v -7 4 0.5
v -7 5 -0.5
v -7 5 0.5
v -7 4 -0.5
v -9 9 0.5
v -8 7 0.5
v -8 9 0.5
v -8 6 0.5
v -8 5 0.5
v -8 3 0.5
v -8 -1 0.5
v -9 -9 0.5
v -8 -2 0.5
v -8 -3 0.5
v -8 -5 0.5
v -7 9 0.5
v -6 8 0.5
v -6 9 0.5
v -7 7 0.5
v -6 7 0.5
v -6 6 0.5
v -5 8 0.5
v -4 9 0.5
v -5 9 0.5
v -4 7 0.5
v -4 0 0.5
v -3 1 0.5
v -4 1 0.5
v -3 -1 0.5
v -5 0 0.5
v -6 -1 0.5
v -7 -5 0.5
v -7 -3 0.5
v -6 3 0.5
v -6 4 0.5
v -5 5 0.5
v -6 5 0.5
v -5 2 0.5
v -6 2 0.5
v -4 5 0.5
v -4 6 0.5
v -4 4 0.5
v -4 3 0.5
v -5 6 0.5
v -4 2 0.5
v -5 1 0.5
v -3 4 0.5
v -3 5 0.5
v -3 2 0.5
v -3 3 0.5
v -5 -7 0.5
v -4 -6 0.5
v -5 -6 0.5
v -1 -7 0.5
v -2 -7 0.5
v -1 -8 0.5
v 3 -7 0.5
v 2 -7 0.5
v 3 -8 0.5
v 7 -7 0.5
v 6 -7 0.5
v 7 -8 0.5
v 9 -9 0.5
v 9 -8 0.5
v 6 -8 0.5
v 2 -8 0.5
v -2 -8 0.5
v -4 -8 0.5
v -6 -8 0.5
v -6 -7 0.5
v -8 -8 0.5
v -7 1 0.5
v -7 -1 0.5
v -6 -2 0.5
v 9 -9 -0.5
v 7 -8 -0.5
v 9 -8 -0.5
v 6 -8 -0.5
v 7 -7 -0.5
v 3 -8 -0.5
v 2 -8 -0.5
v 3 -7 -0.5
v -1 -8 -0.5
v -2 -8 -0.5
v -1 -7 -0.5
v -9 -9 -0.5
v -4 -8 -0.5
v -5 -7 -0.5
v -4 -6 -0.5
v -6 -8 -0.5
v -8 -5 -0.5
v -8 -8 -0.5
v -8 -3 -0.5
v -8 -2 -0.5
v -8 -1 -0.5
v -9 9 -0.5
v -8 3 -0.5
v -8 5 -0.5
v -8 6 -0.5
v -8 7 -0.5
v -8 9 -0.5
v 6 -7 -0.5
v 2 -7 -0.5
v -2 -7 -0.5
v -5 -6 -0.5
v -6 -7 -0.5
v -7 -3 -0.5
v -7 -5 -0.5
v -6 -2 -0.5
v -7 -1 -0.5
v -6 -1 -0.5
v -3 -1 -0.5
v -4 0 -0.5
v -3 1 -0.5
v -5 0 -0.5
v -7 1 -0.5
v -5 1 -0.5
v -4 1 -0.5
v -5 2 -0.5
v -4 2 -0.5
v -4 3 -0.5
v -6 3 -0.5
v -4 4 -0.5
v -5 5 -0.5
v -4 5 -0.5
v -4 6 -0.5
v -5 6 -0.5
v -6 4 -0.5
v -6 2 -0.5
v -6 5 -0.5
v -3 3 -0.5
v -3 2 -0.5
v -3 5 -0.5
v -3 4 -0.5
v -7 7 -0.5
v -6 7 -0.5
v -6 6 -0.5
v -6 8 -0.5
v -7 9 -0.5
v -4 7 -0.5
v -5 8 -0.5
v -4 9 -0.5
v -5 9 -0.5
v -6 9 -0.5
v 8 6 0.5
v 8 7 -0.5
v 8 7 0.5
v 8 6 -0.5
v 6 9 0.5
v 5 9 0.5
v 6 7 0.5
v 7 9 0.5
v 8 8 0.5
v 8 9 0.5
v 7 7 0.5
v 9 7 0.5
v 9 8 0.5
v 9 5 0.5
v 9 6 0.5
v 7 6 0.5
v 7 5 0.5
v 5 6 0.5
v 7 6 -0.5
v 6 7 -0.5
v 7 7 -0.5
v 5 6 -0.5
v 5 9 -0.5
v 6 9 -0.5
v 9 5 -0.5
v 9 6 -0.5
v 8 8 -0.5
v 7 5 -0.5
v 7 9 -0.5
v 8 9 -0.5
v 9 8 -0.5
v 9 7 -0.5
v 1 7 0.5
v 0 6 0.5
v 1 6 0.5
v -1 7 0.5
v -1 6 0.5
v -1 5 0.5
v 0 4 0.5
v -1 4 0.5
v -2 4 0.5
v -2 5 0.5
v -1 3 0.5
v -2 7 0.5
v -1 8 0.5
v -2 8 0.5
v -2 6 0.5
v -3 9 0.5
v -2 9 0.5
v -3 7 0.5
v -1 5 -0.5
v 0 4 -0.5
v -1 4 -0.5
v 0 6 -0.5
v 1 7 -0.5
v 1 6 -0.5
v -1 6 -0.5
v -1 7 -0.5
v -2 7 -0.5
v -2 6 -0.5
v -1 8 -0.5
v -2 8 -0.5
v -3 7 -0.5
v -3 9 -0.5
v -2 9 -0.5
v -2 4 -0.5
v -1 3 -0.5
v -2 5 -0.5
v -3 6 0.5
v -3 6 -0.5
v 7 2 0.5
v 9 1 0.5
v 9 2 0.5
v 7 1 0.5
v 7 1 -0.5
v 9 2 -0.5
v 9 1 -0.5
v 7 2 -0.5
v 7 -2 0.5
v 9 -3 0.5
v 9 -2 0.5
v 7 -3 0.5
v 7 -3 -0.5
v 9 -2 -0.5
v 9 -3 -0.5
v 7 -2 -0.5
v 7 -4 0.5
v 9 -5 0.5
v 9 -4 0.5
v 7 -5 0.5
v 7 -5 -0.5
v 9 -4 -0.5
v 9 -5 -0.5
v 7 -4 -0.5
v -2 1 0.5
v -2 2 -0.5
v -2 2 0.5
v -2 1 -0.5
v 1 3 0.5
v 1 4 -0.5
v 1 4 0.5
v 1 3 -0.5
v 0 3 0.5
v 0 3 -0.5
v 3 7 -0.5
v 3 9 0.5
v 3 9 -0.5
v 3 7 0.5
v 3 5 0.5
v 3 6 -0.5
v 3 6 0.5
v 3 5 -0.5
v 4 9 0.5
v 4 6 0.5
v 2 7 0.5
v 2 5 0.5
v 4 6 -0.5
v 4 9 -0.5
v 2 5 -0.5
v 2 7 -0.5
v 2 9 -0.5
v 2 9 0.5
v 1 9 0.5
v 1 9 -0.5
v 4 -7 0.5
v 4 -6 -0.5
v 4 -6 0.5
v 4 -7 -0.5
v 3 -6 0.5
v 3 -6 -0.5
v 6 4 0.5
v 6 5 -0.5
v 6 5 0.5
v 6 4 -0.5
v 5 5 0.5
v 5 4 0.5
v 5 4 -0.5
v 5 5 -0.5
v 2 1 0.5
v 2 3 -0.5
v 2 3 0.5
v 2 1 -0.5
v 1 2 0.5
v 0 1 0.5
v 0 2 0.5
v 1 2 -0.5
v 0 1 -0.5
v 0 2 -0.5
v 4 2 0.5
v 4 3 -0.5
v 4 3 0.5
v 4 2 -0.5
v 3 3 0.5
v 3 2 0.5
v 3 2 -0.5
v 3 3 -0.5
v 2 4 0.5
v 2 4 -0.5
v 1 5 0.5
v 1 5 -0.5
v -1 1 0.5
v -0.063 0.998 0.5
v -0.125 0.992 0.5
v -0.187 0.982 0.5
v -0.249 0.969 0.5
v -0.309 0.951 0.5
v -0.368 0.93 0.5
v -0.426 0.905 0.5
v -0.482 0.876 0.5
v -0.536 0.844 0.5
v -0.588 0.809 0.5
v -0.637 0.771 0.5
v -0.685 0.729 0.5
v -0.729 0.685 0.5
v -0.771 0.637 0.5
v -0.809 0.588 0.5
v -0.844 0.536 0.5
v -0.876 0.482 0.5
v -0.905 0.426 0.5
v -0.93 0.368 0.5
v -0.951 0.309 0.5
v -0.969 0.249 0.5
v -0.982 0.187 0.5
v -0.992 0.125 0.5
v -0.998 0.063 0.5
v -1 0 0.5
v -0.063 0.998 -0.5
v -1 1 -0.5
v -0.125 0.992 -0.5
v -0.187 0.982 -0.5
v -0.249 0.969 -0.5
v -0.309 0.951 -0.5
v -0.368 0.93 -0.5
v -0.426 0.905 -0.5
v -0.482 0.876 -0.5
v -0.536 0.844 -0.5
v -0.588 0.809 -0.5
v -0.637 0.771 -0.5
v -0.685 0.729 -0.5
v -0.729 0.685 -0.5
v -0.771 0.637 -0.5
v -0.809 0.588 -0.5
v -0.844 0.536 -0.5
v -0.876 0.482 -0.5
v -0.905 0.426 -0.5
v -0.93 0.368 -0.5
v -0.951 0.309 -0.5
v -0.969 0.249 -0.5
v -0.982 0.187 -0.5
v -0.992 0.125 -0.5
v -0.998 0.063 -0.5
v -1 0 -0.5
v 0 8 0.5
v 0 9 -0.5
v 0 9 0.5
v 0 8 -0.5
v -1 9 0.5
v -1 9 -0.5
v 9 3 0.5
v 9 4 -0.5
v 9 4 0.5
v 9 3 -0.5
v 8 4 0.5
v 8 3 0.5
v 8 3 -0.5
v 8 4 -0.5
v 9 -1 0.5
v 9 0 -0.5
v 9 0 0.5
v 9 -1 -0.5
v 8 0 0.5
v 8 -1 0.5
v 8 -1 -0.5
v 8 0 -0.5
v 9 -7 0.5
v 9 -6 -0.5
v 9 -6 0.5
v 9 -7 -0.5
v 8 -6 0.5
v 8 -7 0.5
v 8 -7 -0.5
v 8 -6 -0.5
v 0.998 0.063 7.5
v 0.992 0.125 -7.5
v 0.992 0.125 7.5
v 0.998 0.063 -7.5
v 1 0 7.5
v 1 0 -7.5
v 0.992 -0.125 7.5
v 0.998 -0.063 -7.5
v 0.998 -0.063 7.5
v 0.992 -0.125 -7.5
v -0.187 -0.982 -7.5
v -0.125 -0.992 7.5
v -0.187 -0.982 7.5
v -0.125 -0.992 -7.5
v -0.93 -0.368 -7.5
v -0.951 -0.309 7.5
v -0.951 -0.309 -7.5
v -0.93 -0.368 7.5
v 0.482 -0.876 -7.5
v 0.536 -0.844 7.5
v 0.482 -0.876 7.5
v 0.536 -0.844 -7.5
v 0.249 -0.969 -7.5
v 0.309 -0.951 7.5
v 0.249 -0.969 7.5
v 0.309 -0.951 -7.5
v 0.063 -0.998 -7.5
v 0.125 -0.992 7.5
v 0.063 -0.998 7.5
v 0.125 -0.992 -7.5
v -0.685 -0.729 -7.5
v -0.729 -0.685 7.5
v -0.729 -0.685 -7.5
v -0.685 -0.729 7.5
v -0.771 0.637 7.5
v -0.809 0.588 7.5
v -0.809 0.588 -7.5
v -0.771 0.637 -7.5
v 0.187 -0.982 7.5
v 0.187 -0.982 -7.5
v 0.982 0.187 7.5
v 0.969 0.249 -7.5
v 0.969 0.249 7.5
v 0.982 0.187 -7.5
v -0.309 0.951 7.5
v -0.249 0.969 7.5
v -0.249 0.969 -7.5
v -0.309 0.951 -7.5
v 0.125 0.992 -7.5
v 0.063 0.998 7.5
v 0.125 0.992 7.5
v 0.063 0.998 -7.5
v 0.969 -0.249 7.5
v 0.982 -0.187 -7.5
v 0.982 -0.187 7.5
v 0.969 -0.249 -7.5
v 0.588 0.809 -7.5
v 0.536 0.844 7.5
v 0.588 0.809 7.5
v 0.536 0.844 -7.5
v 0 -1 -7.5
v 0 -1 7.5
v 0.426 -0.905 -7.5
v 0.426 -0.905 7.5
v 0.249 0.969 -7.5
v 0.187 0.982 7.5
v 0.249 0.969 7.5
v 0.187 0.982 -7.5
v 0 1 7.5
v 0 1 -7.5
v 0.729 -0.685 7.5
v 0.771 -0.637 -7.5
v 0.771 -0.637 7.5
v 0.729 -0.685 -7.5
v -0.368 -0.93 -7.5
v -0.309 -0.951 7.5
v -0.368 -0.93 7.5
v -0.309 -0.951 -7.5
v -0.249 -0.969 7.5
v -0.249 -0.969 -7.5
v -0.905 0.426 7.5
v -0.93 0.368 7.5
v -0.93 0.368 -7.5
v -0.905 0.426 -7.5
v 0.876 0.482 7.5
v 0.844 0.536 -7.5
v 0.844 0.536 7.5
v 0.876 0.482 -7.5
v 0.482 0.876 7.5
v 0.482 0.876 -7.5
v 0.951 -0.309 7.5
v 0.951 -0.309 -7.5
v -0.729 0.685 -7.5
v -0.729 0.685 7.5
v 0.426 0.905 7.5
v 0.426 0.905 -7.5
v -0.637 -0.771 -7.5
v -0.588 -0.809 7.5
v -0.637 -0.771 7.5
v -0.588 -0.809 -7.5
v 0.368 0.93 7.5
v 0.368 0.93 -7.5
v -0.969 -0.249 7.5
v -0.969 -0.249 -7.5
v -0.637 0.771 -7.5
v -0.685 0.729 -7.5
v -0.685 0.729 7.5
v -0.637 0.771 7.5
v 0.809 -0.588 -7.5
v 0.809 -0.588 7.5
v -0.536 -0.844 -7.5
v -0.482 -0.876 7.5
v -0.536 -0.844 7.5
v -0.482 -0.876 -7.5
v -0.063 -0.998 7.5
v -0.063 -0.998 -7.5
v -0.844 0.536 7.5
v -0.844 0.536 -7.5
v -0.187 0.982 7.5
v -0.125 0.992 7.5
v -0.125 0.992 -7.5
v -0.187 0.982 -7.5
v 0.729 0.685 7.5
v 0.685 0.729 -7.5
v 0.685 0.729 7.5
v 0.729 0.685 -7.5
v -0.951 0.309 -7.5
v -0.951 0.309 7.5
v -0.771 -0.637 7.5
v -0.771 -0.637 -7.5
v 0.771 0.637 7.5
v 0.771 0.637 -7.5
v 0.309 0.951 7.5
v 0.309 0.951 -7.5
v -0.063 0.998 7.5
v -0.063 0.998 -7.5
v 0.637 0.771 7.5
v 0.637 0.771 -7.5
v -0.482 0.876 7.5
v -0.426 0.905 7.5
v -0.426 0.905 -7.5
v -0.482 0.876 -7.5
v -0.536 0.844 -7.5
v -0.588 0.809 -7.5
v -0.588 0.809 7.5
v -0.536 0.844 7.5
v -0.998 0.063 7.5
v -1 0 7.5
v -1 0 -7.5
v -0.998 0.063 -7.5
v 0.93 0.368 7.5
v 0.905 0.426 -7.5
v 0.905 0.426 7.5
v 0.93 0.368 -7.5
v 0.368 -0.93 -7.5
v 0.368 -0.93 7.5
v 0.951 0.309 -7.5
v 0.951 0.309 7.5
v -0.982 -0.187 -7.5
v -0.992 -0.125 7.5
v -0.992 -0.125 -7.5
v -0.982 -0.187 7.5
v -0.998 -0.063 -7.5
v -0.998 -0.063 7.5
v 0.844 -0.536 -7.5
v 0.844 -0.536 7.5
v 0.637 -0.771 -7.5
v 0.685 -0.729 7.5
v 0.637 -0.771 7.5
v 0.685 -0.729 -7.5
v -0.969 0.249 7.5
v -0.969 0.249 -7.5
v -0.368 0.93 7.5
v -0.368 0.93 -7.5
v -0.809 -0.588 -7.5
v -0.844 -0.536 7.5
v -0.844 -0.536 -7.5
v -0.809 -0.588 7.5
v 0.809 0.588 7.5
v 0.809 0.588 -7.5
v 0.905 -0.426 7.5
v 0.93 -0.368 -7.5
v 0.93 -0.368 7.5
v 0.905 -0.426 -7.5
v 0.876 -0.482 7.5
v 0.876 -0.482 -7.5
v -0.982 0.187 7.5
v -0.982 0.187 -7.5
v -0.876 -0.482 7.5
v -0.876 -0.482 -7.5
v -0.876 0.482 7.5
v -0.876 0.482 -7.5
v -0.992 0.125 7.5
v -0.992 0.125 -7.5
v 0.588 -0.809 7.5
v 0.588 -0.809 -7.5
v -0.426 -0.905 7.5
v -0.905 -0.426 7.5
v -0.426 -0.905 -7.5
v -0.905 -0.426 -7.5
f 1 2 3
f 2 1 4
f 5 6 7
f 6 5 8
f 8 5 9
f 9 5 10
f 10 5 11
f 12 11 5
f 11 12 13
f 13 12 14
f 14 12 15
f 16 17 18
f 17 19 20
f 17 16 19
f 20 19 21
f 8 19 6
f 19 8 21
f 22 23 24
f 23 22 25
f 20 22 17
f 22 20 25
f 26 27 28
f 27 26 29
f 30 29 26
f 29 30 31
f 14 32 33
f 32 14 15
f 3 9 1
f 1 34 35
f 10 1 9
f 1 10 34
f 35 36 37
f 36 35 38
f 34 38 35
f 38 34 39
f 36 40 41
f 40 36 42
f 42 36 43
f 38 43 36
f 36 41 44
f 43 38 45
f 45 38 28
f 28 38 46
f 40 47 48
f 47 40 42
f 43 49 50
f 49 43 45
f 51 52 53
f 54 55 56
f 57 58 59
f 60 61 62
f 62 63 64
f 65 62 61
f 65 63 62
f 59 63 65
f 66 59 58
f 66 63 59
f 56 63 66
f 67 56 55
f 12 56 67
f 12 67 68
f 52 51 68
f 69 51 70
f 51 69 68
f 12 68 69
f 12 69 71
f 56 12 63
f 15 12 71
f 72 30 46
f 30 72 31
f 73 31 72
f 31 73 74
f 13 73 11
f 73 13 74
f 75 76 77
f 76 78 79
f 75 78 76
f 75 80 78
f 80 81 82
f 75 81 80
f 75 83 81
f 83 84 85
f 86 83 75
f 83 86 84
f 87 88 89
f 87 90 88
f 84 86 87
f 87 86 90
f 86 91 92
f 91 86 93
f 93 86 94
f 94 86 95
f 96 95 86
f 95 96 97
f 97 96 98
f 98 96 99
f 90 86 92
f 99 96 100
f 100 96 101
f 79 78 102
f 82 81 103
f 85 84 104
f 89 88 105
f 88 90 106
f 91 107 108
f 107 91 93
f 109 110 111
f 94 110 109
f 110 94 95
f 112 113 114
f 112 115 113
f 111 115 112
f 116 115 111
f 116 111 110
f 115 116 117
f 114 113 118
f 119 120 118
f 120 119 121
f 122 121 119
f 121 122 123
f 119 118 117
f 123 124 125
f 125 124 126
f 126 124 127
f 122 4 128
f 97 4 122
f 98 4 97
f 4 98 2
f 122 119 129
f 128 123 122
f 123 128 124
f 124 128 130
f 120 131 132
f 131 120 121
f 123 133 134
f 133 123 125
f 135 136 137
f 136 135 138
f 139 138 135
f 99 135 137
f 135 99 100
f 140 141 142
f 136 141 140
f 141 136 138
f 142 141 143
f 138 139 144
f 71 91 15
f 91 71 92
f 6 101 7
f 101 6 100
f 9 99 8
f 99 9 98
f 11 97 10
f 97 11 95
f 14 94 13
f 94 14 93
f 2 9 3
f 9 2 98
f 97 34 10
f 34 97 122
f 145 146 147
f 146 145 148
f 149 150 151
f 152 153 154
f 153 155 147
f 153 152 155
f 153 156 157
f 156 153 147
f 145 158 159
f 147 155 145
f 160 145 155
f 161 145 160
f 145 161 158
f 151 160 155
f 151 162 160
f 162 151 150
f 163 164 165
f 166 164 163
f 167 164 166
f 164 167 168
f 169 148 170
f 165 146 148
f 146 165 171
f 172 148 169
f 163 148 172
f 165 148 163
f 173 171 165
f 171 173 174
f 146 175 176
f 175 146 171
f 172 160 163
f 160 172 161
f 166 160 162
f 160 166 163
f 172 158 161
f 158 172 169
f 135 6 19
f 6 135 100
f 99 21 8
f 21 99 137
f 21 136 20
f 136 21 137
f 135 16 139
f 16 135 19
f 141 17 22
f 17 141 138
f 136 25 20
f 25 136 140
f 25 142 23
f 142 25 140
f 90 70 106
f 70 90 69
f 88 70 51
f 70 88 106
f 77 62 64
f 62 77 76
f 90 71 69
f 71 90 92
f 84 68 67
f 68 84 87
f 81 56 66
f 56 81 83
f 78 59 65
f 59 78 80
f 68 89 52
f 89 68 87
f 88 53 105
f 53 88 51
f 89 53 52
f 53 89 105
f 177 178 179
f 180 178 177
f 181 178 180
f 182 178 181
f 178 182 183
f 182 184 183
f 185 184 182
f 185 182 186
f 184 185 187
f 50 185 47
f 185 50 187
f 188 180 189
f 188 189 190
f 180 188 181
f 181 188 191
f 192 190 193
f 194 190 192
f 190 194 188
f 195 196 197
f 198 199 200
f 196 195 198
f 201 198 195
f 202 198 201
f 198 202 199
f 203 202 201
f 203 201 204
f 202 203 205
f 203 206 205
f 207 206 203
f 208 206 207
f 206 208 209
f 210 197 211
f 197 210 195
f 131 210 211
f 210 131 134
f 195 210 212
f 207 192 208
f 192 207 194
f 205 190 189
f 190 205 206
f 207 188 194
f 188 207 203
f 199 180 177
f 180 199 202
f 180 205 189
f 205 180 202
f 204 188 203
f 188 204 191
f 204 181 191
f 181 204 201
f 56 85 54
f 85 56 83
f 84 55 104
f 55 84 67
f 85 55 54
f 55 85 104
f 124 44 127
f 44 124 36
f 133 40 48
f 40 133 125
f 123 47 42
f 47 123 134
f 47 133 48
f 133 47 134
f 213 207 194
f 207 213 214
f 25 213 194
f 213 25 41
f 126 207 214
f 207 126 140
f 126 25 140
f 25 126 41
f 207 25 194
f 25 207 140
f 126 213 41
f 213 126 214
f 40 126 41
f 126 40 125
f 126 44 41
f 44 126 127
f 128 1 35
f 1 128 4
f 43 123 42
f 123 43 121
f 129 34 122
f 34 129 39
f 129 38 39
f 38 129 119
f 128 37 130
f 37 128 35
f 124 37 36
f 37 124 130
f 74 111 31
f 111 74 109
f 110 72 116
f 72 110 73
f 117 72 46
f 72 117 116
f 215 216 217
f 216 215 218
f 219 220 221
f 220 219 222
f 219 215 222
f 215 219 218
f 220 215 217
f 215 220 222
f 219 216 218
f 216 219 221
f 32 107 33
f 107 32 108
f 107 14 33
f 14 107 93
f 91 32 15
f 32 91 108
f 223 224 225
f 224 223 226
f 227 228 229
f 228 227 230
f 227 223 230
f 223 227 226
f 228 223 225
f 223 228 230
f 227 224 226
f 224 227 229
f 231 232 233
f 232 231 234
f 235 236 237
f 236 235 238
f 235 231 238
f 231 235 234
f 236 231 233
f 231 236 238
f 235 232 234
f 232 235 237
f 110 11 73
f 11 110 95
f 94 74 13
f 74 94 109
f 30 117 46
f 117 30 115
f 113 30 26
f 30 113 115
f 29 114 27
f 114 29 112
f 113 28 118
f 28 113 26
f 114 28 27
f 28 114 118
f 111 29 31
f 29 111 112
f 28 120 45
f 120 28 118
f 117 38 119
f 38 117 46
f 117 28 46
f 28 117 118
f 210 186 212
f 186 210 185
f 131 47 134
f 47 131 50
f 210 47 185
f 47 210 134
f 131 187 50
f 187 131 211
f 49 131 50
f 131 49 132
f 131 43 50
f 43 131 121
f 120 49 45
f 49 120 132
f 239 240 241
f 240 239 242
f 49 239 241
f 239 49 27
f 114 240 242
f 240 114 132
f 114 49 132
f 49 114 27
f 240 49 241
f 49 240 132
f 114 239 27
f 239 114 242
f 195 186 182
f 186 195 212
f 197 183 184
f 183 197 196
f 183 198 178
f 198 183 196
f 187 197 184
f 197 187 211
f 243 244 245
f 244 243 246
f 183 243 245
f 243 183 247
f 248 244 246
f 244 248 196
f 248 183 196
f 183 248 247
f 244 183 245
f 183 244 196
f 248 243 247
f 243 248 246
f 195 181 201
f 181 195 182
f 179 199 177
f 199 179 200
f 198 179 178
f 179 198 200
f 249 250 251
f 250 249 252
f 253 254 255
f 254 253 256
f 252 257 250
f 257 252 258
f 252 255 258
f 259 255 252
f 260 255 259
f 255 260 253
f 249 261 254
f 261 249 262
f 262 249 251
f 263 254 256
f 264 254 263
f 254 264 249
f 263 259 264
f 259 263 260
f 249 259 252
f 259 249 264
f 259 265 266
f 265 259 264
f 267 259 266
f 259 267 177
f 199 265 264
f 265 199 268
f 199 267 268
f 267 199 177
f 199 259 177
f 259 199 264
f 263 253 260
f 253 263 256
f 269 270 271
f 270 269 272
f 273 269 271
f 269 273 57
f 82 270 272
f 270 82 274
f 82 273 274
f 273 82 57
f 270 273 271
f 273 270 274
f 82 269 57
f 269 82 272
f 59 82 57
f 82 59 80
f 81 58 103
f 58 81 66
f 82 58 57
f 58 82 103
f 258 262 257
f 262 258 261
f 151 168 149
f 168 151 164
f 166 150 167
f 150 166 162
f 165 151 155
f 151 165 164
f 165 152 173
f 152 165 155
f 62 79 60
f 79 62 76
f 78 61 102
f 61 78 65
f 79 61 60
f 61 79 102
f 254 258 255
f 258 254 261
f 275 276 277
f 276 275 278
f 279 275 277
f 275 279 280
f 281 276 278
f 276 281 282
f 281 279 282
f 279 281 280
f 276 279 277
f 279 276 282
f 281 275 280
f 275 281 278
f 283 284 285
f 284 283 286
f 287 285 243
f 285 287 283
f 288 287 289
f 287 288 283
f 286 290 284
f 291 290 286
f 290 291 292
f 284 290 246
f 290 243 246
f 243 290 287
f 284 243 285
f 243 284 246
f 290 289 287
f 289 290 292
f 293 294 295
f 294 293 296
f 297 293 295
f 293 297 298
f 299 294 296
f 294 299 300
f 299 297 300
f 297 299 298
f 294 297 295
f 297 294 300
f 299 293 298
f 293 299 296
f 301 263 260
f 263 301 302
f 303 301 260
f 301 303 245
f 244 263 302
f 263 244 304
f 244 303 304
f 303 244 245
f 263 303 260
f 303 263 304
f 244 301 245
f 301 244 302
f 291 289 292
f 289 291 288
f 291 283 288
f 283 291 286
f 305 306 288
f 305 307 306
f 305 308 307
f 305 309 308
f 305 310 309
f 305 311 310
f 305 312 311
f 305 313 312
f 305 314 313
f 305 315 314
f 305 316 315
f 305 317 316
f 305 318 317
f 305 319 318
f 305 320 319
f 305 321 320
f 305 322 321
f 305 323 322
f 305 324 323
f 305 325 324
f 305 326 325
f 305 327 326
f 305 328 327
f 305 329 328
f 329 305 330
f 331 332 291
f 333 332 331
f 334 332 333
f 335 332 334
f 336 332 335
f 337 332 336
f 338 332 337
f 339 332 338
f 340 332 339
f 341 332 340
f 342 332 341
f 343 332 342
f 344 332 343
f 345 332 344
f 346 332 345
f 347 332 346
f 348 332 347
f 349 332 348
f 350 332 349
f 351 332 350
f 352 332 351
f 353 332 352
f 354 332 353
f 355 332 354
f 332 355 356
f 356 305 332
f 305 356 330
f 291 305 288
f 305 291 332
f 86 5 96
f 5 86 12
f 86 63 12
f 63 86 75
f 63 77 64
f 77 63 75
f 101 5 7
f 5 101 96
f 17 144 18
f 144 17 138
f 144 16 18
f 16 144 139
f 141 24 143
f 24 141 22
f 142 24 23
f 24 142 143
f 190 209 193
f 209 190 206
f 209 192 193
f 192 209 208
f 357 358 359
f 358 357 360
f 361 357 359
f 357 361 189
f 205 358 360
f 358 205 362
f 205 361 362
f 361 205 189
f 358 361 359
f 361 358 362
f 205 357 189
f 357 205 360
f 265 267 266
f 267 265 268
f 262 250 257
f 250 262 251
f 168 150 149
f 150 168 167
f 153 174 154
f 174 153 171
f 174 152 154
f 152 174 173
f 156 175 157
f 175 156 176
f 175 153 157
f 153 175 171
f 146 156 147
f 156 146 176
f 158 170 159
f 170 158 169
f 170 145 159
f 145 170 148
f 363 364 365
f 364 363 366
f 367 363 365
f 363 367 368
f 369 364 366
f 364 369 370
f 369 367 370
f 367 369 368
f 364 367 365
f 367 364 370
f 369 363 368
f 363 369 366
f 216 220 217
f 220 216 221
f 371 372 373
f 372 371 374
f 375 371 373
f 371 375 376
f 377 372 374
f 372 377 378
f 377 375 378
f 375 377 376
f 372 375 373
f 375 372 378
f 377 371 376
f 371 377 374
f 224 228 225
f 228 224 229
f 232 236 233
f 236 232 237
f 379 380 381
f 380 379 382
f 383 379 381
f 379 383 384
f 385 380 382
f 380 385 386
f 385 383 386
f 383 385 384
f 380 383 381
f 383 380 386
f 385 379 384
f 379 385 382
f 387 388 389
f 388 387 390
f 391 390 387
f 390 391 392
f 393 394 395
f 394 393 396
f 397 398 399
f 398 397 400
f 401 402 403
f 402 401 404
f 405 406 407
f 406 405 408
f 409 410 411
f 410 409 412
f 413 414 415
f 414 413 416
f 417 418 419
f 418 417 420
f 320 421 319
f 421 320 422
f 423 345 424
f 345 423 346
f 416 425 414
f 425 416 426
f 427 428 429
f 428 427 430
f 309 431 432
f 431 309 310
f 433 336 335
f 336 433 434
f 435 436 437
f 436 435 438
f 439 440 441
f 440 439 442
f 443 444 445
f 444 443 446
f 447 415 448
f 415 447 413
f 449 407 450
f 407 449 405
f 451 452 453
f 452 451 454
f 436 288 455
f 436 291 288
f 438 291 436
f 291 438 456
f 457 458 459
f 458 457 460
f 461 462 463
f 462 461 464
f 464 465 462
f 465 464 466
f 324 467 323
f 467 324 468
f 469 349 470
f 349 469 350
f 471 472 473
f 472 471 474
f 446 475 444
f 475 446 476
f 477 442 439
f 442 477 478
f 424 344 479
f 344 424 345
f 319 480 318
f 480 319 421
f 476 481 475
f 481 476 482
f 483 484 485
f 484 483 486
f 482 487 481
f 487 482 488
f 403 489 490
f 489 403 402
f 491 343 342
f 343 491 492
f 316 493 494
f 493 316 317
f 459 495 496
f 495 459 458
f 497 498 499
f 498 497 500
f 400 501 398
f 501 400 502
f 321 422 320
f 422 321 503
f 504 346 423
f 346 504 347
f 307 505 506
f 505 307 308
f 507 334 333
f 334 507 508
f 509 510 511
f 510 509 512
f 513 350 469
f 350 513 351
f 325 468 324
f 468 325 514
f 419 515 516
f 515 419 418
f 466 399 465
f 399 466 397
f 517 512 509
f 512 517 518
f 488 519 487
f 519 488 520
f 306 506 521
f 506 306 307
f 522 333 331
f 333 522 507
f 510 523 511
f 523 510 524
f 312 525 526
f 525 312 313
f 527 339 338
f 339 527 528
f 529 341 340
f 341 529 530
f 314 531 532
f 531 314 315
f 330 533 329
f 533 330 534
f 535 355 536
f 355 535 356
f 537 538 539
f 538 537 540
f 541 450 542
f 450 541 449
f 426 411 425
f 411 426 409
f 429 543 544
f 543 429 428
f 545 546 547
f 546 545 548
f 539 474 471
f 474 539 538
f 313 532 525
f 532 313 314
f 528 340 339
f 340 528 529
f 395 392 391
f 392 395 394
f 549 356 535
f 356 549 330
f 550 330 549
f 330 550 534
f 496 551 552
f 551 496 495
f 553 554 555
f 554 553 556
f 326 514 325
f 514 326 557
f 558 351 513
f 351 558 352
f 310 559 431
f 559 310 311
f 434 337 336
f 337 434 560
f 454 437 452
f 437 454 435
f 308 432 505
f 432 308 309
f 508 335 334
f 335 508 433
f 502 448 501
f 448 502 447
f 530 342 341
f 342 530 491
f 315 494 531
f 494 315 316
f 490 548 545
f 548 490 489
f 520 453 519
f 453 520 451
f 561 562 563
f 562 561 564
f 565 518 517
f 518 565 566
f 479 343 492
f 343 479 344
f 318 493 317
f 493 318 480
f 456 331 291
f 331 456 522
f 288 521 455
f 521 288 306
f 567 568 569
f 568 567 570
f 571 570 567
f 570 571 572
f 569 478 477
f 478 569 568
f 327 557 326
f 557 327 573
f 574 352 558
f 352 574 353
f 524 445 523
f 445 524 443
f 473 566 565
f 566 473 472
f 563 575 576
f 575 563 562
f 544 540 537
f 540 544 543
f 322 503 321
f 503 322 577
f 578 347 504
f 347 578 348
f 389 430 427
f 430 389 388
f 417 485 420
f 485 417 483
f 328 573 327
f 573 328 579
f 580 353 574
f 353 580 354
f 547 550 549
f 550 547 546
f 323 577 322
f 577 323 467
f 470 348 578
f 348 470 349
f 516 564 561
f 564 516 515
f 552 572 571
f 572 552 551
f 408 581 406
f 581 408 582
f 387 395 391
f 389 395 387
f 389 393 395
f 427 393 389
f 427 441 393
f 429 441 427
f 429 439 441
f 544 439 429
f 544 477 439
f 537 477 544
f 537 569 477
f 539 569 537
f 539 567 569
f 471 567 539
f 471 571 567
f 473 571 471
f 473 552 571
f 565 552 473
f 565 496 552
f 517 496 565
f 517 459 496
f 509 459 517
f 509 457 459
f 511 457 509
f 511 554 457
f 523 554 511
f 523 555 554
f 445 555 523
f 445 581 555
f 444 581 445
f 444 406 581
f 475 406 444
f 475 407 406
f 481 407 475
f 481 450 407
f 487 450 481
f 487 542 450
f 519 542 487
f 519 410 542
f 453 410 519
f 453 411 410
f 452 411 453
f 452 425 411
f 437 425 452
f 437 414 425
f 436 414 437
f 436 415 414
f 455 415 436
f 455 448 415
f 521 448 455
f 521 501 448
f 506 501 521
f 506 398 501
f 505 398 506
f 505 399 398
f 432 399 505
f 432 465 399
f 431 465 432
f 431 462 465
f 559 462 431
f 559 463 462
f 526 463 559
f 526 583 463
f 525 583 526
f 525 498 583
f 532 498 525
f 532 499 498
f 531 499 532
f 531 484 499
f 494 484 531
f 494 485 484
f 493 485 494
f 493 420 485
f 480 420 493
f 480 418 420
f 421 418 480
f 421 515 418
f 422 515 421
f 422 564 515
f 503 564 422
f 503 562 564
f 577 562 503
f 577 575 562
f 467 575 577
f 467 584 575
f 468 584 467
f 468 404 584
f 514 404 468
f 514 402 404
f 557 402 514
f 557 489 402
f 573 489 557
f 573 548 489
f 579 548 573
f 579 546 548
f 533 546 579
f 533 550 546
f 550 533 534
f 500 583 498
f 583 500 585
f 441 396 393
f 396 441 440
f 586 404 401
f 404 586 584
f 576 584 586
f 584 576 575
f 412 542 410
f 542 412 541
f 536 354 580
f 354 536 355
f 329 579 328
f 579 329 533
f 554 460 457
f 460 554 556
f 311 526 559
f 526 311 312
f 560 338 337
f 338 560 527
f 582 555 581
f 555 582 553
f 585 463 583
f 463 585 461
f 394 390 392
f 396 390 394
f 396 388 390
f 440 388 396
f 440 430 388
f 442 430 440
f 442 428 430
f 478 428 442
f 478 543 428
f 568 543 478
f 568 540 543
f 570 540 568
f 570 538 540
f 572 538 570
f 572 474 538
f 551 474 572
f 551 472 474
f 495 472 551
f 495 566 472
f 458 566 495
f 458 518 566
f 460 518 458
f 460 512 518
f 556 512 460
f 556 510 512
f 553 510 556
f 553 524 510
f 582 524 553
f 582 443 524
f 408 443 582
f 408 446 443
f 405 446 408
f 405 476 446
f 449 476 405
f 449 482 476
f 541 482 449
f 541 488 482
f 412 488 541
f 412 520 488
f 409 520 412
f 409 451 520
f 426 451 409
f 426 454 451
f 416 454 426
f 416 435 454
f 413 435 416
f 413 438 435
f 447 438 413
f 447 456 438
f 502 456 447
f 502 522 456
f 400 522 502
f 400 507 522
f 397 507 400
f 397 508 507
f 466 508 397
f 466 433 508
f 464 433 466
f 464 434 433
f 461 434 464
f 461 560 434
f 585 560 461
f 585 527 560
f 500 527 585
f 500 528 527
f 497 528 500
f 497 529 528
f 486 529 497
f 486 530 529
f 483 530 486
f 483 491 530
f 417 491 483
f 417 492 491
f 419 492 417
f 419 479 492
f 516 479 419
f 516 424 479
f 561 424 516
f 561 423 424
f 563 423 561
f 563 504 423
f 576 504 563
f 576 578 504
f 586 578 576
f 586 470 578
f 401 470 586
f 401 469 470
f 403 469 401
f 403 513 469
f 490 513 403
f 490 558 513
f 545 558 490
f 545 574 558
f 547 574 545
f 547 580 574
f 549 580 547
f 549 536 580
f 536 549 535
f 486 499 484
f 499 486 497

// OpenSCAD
/* Unit Test 17: same as test case 06, center=true */
use <../datamatrix.scad>
data_matrix(dm_ascii("Hourez Jonathan"), mark="black", center=true);

/* indicate where the origin is since the images don't show the axes */
cylinder(15, 1, center=true, $fn=100);
